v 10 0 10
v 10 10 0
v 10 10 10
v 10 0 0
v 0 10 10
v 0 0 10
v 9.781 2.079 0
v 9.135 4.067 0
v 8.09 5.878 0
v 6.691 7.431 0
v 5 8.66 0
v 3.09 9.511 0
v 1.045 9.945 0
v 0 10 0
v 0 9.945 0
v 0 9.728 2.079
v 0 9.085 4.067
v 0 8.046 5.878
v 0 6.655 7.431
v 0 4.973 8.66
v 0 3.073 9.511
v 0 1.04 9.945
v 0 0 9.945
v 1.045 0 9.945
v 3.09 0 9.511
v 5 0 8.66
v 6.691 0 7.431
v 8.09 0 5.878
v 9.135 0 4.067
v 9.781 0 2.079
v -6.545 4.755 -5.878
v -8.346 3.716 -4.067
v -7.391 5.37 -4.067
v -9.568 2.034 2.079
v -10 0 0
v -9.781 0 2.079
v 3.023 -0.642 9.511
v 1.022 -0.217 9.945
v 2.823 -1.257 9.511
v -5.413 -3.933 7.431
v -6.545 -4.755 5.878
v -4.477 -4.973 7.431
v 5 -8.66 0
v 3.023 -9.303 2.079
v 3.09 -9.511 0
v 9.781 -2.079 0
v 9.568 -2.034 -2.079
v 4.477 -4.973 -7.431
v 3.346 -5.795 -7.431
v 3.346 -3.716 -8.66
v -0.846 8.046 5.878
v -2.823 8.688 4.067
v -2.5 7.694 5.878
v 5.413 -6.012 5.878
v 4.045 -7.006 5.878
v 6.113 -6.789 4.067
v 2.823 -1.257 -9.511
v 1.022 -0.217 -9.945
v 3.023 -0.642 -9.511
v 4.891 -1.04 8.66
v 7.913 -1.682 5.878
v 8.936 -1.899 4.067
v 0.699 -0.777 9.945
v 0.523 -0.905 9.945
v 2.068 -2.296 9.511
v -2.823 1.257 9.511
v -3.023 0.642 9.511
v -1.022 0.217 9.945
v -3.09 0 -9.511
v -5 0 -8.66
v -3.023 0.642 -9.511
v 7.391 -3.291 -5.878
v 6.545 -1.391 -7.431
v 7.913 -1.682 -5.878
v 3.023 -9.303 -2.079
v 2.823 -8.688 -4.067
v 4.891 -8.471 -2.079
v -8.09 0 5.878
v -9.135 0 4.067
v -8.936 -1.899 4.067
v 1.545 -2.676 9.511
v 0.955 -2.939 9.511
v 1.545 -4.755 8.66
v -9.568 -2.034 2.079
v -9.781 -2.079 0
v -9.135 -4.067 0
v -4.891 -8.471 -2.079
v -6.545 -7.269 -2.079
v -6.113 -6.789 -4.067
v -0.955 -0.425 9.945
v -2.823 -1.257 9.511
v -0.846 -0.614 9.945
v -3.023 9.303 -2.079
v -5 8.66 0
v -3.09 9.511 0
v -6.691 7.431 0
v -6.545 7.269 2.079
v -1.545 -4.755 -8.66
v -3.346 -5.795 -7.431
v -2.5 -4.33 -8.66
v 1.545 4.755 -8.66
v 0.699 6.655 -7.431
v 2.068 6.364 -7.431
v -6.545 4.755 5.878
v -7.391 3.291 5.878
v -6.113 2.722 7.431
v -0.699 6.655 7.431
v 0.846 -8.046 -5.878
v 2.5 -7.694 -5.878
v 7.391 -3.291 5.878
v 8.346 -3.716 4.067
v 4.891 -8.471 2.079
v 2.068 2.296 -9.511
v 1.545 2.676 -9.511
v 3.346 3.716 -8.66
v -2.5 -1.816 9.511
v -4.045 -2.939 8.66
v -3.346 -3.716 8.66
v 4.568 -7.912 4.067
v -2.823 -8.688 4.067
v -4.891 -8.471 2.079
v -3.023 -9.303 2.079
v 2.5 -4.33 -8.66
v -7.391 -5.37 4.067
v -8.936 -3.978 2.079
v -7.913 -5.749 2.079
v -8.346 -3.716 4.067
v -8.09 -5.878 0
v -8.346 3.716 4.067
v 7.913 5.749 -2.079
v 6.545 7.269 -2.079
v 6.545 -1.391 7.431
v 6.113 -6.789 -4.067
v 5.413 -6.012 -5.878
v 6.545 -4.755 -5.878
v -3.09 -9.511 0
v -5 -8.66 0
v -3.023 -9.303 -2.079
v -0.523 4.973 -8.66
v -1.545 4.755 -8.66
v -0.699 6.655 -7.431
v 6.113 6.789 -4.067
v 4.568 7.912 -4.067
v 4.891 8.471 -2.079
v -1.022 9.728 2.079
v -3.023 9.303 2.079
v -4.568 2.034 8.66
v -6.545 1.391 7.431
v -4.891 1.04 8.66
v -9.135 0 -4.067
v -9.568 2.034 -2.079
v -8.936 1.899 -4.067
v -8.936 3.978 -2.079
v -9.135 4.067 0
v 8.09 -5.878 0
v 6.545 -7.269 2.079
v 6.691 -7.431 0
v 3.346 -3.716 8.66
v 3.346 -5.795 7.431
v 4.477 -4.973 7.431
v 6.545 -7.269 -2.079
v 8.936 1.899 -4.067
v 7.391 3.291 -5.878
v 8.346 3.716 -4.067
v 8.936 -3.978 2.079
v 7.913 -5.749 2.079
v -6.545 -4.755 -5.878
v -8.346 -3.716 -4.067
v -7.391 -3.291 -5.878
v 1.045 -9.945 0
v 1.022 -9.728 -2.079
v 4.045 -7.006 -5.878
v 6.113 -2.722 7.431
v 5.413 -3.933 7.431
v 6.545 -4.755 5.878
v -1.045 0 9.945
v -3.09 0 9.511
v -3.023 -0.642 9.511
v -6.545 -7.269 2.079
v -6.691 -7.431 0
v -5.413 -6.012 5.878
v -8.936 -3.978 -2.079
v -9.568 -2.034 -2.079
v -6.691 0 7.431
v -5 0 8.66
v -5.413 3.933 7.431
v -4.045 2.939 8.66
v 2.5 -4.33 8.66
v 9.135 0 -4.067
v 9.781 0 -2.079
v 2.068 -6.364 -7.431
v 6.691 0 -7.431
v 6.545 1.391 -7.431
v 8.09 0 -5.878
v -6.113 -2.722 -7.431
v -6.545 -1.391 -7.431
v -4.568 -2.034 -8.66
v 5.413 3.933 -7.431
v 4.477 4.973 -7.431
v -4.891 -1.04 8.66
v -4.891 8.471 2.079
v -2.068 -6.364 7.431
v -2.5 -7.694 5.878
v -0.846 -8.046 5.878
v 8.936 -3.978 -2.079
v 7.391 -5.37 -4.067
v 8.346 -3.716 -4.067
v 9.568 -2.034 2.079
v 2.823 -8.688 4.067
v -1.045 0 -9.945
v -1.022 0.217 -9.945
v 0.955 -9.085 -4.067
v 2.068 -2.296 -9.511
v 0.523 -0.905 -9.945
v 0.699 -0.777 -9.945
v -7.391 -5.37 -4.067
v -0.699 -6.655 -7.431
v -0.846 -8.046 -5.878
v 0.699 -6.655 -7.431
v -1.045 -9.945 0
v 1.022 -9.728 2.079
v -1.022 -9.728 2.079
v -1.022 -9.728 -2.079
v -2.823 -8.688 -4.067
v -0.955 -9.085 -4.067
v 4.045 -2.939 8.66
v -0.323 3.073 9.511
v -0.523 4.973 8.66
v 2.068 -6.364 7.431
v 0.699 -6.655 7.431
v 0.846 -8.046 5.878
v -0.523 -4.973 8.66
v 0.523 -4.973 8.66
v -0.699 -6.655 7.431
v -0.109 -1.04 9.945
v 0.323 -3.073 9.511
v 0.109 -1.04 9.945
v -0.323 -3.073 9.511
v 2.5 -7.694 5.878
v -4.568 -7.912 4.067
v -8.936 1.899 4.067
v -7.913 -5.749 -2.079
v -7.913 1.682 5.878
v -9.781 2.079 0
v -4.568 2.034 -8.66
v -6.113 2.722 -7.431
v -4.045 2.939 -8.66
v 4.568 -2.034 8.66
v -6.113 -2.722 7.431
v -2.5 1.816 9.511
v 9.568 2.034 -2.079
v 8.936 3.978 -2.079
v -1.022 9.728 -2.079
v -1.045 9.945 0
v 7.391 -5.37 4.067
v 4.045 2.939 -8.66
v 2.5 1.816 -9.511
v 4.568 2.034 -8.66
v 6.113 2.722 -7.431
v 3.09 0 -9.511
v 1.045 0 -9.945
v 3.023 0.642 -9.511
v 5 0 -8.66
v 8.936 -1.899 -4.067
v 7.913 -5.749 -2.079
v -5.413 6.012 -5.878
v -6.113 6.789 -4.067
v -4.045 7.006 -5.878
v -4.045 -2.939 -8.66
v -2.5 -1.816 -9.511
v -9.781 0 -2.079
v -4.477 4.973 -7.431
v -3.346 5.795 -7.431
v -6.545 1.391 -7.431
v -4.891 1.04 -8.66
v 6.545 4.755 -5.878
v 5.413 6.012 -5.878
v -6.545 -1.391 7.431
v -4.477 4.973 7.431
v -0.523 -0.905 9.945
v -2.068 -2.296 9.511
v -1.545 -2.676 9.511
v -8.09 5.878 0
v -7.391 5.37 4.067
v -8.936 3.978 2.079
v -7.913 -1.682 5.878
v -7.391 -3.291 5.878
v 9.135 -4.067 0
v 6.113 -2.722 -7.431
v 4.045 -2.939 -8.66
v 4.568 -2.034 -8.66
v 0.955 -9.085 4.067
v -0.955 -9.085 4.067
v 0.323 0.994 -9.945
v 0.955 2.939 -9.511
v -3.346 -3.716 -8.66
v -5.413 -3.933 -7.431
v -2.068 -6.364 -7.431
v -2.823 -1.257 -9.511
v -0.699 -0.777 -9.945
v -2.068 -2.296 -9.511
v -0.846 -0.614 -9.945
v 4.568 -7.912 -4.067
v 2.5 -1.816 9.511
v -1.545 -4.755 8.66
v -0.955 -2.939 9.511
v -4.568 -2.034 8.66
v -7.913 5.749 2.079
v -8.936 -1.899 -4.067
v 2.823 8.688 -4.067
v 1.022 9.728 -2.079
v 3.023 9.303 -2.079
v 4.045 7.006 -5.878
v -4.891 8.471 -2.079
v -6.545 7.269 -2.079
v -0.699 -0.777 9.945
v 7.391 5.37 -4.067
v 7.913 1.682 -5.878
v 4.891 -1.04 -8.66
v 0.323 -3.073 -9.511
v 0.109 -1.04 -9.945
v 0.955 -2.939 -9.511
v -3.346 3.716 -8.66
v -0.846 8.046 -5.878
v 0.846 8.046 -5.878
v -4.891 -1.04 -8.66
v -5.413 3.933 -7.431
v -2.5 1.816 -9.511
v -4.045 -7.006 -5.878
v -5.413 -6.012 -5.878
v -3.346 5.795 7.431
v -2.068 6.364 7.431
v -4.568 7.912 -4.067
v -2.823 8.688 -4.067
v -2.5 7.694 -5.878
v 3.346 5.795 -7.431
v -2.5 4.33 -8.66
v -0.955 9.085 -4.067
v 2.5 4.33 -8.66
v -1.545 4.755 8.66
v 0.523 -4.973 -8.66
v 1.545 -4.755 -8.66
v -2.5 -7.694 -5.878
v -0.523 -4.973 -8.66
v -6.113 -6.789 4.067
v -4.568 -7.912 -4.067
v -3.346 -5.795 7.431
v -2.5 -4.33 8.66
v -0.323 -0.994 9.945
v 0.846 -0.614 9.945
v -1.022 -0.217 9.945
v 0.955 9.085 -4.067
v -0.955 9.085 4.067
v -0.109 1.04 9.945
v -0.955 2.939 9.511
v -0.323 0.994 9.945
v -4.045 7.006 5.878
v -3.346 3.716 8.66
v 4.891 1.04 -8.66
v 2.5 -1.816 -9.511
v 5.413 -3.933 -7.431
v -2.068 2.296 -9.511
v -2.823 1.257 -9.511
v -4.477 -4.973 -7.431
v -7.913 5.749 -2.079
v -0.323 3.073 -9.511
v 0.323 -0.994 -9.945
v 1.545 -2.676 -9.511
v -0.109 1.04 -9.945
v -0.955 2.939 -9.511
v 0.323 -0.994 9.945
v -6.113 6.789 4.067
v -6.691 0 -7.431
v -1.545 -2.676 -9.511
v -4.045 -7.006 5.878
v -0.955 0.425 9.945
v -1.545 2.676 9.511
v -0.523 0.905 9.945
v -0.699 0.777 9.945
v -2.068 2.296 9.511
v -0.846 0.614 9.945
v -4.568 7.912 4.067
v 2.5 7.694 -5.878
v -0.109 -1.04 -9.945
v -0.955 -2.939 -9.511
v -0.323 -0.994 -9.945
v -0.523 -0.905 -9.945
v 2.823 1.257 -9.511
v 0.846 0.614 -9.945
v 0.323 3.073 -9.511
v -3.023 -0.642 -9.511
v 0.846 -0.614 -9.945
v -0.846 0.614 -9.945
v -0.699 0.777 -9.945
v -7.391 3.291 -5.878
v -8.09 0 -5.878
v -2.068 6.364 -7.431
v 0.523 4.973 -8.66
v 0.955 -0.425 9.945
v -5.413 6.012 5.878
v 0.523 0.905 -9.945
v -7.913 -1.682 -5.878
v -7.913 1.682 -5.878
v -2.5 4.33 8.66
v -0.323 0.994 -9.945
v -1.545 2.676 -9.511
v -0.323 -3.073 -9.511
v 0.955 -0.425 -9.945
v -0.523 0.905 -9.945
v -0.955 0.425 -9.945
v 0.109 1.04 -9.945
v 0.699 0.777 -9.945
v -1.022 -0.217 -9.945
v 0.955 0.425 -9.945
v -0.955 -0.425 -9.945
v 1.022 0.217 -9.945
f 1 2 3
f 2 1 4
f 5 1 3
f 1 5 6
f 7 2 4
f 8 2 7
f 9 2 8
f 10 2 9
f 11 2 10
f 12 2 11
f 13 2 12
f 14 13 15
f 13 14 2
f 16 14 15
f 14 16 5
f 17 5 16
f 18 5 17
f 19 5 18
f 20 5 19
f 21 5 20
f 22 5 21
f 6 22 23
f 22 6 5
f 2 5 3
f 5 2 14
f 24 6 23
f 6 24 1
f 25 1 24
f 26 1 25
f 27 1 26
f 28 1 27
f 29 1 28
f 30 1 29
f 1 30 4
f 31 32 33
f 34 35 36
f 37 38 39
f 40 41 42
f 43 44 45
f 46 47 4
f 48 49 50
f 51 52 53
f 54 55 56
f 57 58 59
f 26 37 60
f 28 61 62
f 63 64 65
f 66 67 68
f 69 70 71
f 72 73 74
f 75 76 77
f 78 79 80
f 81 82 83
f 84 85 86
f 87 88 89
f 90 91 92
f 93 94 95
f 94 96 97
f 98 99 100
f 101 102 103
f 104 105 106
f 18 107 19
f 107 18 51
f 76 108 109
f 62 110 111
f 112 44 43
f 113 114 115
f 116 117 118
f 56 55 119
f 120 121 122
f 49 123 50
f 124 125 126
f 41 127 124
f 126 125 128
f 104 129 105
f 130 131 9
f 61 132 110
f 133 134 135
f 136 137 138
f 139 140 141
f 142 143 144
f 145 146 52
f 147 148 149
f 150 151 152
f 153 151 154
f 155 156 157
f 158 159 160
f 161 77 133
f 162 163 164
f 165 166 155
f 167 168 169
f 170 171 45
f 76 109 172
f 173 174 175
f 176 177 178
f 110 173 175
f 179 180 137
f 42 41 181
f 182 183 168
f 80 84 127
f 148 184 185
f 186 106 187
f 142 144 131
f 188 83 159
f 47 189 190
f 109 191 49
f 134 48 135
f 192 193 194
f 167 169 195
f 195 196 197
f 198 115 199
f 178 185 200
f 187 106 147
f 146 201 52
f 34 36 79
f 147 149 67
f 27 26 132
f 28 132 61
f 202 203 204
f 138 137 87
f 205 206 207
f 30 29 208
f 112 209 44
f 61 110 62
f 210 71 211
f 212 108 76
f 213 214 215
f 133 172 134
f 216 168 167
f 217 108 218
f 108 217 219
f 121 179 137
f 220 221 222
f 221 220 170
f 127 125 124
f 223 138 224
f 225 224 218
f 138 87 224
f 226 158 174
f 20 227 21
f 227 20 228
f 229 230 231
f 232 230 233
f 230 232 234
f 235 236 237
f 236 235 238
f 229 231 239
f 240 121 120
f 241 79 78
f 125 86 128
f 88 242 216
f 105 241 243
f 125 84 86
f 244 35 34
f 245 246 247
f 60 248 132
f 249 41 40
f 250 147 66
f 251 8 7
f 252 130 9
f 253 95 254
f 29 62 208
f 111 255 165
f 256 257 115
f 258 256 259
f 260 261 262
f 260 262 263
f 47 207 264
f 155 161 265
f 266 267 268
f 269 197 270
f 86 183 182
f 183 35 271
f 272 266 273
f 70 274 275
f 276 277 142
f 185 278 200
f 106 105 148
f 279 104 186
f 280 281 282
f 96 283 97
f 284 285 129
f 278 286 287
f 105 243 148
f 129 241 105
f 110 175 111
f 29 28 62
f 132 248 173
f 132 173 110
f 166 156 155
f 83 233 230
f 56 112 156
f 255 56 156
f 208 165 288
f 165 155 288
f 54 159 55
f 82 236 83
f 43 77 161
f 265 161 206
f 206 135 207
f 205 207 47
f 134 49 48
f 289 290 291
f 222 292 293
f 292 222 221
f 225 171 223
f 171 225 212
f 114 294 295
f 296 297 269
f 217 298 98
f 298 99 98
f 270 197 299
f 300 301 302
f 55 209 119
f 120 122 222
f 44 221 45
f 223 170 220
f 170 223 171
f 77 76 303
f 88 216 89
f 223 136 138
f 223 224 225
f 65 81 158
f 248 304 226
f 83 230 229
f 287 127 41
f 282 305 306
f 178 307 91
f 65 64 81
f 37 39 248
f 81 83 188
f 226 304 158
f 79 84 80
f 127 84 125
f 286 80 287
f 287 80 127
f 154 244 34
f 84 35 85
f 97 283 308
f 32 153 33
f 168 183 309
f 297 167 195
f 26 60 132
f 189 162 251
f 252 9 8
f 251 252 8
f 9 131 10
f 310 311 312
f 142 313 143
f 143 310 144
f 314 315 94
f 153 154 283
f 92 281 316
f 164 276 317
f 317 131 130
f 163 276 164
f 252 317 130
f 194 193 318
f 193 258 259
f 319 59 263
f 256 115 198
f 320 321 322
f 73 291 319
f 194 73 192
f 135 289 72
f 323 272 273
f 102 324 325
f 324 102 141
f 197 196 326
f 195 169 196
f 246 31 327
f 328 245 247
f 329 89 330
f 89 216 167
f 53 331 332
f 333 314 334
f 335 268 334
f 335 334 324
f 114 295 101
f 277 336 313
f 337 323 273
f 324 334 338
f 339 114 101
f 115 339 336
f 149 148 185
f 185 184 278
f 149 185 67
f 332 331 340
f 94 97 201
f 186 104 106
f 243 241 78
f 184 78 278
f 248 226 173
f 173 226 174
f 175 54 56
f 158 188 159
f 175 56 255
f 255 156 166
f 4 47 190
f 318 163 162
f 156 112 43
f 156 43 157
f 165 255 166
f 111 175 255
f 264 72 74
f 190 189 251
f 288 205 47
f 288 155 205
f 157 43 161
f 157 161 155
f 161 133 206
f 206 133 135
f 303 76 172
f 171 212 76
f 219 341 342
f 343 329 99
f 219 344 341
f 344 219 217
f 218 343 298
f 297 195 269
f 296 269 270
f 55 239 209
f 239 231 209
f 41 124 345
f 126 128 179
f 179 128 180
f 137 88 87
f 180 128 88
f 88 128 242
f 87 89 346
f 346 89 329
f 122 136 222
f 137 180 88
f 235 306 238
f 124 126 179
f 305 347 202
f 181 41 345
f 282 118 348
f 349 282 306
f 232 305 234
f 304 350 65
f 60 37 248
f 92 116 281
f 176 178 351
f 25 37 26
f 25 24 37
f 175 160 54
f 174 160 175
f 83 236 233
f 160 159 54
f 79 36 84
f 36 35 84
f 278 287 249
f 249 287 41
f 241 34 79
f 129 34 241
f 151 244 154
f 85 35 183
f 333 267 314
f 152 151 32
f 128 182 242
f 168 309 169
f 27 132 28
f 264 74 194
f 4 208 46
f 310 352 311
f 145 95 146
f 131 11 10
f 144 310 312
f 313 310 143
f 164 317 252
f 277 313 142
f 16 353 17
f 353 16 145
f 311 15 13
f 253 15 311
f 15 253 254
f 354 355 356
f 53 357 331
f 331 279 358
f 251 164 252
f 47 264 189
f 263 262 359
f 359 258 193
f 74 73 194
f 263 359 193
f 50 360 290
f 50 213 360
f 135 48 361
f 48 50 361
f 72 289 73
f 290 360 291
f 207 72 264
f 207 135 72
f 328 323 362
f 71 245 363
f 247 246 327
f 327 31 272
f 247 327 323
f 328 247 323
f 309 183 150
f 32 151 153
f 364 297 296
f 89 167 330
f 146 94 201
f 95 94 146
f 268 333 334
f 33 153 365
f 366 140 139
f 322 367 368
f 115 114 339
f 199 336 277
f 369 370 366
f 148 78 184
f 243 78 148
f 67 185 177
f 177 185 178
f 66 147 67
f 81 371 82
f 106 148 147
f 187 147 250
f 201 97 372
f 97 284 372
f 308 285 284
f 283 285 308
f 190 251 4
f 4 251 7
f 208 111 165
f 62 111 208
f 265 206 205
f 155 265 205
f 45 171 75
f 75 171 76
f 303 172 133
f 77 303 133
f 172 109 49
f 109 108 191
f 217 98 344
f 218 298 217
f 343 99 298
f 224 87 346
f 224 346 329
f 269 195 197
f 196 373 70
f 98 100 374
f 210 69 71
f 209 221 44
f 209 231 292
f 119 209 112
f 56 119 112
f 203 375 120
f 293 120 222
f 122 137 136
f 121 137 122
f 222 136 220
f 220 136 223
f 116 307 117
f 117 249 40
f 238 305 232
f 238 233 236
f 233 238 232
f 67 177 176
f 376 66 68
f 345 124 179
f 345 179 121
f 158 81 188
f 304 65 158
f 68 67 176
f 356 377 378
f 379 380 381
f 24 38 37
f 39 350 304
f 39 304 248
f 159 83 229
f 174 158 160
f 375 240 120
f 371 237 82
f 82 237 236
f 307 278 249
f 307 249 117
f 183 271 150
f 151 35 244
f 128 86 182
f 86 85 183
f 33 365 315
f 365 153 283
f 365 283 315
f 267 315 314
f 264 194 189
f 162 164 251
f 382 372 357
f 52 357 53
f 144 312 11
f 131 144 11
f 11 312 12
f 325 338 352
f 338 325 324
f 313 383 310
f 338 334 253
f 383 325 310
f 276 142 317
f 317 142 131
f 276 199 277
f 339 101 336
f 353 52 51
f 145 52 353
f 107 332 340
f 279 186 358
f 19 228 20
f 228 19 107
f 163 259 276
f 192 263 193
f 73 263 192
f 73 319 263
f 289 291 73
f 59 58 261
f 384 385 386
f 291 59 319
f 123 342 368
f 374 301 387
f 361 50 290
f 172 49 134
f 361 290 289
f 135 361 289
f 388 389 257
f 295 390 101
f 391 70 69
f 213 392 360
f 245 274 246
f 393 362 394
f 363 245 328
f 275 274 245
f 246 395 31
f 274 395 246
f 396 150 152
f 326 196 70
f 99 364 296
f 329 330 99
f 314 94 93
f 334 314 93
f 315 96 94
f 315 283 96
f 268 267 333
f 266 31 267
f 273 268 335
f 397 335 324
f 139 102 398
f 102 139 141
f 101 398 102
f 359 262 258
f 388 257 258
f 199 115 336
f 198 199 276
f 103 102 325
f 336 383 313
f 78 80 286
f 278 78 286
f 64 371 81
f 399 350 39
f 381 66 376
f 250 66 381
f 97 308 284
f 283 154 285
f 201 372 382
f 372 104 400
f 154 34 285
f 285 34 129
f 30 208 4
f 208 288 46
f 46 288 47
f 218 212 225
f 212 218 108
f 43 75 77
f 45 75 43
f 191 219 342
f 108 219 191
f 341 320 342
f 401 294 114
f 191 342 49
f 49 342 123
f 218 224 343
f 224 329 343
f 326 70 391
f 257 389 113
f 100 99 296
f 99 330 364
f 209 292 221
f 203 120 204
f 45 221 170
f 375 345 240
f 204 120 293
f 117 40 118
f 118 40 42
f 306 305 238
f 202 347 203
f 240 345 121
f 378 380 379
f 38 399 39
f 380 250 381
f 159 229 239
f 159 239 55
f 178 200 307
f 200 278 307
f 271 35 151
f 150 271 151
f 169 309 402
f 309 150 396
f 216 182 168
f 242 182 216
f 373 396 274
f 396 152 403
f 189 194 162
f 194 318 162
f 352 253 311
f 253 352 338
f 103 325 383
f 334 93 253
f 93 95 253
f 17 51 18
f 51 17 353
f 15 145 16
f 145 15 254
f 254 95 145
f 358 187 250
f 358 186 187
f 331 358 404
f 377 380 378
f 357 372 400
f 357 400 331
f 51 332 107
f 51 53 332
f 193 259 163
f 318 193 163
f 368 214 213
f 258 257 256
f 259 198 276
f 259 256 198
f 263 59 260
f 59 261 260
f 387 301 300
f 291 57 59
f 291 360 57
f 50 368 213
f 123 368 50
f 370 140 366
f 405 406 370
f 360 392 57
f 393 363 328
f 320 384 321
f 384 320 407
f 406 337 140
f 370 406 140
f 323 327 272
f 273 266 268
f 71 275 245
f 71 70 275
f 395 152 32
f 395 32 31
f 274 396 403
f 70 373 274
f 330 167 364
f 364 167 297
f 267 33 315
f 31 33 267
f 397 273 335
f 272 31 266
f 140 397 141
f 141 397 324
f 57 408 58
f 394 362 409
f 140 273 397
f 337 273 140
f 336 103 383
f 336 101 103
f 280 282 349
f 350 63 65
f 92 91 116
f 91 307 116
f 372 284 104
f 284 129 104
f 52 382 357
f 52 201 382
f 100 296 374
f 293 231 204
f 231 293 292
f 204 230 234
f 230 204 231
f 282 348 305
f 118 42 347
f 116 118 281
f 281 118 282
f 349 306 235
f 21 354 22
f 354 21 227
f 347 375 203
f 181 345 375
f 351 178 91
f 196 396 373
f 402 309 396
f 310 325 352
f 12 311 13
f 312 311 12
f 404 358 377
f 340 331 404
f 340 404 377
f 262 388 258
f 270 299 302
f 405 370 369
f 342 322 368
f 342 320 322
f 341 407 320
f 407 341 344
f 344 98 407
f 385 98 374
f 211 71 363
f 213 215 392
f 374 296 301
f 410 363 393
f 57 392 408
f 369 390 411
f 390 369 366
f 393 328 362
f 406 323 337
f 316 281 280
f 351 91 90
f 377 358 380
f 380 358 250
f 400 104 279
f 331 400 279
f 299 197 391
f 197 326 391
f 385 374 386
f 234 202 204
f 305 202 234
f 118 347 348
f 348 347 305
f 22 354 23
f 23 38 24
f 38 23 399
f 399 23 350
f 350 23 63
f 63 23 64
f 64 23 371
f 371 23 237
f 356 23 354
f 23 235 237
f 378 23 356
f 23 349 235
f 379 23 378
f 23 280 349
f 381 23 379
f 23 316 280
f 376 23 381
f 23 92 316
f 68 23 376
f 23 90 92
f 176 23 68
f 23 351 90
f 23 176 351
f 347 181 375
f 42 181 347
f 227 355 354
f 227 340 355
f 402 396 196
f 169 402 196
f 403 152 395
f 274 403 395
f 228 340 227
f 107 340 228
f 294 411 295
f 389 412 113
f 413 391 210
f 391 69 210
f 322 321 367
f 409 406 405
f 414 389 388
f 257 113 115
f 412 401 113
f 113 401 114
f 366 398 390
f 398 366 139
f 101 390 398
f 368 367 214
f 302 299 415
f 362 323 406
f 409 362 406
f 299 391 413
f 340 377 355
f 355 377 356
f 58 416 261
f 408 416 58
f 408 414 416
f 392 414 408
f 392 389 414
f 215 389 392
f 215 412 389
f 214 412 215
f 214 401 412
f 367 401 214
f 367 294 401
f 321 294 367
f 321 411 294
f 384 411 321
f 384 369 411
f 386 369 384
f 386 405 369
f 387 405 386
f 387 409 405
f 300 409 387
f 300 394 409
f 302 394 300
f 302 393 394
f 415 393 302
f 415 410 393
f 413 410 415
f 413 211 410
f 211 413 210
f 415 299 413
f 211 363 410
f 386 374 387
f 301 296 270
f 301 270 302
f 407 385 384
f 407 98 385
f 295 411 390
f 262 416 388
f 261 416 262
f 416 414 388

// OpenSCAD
// Test function calls for grammar analysis
cube(10);
sphere(r=5);
translate([1, 2, 3]) cube(5);
color("red") sphere(10);
